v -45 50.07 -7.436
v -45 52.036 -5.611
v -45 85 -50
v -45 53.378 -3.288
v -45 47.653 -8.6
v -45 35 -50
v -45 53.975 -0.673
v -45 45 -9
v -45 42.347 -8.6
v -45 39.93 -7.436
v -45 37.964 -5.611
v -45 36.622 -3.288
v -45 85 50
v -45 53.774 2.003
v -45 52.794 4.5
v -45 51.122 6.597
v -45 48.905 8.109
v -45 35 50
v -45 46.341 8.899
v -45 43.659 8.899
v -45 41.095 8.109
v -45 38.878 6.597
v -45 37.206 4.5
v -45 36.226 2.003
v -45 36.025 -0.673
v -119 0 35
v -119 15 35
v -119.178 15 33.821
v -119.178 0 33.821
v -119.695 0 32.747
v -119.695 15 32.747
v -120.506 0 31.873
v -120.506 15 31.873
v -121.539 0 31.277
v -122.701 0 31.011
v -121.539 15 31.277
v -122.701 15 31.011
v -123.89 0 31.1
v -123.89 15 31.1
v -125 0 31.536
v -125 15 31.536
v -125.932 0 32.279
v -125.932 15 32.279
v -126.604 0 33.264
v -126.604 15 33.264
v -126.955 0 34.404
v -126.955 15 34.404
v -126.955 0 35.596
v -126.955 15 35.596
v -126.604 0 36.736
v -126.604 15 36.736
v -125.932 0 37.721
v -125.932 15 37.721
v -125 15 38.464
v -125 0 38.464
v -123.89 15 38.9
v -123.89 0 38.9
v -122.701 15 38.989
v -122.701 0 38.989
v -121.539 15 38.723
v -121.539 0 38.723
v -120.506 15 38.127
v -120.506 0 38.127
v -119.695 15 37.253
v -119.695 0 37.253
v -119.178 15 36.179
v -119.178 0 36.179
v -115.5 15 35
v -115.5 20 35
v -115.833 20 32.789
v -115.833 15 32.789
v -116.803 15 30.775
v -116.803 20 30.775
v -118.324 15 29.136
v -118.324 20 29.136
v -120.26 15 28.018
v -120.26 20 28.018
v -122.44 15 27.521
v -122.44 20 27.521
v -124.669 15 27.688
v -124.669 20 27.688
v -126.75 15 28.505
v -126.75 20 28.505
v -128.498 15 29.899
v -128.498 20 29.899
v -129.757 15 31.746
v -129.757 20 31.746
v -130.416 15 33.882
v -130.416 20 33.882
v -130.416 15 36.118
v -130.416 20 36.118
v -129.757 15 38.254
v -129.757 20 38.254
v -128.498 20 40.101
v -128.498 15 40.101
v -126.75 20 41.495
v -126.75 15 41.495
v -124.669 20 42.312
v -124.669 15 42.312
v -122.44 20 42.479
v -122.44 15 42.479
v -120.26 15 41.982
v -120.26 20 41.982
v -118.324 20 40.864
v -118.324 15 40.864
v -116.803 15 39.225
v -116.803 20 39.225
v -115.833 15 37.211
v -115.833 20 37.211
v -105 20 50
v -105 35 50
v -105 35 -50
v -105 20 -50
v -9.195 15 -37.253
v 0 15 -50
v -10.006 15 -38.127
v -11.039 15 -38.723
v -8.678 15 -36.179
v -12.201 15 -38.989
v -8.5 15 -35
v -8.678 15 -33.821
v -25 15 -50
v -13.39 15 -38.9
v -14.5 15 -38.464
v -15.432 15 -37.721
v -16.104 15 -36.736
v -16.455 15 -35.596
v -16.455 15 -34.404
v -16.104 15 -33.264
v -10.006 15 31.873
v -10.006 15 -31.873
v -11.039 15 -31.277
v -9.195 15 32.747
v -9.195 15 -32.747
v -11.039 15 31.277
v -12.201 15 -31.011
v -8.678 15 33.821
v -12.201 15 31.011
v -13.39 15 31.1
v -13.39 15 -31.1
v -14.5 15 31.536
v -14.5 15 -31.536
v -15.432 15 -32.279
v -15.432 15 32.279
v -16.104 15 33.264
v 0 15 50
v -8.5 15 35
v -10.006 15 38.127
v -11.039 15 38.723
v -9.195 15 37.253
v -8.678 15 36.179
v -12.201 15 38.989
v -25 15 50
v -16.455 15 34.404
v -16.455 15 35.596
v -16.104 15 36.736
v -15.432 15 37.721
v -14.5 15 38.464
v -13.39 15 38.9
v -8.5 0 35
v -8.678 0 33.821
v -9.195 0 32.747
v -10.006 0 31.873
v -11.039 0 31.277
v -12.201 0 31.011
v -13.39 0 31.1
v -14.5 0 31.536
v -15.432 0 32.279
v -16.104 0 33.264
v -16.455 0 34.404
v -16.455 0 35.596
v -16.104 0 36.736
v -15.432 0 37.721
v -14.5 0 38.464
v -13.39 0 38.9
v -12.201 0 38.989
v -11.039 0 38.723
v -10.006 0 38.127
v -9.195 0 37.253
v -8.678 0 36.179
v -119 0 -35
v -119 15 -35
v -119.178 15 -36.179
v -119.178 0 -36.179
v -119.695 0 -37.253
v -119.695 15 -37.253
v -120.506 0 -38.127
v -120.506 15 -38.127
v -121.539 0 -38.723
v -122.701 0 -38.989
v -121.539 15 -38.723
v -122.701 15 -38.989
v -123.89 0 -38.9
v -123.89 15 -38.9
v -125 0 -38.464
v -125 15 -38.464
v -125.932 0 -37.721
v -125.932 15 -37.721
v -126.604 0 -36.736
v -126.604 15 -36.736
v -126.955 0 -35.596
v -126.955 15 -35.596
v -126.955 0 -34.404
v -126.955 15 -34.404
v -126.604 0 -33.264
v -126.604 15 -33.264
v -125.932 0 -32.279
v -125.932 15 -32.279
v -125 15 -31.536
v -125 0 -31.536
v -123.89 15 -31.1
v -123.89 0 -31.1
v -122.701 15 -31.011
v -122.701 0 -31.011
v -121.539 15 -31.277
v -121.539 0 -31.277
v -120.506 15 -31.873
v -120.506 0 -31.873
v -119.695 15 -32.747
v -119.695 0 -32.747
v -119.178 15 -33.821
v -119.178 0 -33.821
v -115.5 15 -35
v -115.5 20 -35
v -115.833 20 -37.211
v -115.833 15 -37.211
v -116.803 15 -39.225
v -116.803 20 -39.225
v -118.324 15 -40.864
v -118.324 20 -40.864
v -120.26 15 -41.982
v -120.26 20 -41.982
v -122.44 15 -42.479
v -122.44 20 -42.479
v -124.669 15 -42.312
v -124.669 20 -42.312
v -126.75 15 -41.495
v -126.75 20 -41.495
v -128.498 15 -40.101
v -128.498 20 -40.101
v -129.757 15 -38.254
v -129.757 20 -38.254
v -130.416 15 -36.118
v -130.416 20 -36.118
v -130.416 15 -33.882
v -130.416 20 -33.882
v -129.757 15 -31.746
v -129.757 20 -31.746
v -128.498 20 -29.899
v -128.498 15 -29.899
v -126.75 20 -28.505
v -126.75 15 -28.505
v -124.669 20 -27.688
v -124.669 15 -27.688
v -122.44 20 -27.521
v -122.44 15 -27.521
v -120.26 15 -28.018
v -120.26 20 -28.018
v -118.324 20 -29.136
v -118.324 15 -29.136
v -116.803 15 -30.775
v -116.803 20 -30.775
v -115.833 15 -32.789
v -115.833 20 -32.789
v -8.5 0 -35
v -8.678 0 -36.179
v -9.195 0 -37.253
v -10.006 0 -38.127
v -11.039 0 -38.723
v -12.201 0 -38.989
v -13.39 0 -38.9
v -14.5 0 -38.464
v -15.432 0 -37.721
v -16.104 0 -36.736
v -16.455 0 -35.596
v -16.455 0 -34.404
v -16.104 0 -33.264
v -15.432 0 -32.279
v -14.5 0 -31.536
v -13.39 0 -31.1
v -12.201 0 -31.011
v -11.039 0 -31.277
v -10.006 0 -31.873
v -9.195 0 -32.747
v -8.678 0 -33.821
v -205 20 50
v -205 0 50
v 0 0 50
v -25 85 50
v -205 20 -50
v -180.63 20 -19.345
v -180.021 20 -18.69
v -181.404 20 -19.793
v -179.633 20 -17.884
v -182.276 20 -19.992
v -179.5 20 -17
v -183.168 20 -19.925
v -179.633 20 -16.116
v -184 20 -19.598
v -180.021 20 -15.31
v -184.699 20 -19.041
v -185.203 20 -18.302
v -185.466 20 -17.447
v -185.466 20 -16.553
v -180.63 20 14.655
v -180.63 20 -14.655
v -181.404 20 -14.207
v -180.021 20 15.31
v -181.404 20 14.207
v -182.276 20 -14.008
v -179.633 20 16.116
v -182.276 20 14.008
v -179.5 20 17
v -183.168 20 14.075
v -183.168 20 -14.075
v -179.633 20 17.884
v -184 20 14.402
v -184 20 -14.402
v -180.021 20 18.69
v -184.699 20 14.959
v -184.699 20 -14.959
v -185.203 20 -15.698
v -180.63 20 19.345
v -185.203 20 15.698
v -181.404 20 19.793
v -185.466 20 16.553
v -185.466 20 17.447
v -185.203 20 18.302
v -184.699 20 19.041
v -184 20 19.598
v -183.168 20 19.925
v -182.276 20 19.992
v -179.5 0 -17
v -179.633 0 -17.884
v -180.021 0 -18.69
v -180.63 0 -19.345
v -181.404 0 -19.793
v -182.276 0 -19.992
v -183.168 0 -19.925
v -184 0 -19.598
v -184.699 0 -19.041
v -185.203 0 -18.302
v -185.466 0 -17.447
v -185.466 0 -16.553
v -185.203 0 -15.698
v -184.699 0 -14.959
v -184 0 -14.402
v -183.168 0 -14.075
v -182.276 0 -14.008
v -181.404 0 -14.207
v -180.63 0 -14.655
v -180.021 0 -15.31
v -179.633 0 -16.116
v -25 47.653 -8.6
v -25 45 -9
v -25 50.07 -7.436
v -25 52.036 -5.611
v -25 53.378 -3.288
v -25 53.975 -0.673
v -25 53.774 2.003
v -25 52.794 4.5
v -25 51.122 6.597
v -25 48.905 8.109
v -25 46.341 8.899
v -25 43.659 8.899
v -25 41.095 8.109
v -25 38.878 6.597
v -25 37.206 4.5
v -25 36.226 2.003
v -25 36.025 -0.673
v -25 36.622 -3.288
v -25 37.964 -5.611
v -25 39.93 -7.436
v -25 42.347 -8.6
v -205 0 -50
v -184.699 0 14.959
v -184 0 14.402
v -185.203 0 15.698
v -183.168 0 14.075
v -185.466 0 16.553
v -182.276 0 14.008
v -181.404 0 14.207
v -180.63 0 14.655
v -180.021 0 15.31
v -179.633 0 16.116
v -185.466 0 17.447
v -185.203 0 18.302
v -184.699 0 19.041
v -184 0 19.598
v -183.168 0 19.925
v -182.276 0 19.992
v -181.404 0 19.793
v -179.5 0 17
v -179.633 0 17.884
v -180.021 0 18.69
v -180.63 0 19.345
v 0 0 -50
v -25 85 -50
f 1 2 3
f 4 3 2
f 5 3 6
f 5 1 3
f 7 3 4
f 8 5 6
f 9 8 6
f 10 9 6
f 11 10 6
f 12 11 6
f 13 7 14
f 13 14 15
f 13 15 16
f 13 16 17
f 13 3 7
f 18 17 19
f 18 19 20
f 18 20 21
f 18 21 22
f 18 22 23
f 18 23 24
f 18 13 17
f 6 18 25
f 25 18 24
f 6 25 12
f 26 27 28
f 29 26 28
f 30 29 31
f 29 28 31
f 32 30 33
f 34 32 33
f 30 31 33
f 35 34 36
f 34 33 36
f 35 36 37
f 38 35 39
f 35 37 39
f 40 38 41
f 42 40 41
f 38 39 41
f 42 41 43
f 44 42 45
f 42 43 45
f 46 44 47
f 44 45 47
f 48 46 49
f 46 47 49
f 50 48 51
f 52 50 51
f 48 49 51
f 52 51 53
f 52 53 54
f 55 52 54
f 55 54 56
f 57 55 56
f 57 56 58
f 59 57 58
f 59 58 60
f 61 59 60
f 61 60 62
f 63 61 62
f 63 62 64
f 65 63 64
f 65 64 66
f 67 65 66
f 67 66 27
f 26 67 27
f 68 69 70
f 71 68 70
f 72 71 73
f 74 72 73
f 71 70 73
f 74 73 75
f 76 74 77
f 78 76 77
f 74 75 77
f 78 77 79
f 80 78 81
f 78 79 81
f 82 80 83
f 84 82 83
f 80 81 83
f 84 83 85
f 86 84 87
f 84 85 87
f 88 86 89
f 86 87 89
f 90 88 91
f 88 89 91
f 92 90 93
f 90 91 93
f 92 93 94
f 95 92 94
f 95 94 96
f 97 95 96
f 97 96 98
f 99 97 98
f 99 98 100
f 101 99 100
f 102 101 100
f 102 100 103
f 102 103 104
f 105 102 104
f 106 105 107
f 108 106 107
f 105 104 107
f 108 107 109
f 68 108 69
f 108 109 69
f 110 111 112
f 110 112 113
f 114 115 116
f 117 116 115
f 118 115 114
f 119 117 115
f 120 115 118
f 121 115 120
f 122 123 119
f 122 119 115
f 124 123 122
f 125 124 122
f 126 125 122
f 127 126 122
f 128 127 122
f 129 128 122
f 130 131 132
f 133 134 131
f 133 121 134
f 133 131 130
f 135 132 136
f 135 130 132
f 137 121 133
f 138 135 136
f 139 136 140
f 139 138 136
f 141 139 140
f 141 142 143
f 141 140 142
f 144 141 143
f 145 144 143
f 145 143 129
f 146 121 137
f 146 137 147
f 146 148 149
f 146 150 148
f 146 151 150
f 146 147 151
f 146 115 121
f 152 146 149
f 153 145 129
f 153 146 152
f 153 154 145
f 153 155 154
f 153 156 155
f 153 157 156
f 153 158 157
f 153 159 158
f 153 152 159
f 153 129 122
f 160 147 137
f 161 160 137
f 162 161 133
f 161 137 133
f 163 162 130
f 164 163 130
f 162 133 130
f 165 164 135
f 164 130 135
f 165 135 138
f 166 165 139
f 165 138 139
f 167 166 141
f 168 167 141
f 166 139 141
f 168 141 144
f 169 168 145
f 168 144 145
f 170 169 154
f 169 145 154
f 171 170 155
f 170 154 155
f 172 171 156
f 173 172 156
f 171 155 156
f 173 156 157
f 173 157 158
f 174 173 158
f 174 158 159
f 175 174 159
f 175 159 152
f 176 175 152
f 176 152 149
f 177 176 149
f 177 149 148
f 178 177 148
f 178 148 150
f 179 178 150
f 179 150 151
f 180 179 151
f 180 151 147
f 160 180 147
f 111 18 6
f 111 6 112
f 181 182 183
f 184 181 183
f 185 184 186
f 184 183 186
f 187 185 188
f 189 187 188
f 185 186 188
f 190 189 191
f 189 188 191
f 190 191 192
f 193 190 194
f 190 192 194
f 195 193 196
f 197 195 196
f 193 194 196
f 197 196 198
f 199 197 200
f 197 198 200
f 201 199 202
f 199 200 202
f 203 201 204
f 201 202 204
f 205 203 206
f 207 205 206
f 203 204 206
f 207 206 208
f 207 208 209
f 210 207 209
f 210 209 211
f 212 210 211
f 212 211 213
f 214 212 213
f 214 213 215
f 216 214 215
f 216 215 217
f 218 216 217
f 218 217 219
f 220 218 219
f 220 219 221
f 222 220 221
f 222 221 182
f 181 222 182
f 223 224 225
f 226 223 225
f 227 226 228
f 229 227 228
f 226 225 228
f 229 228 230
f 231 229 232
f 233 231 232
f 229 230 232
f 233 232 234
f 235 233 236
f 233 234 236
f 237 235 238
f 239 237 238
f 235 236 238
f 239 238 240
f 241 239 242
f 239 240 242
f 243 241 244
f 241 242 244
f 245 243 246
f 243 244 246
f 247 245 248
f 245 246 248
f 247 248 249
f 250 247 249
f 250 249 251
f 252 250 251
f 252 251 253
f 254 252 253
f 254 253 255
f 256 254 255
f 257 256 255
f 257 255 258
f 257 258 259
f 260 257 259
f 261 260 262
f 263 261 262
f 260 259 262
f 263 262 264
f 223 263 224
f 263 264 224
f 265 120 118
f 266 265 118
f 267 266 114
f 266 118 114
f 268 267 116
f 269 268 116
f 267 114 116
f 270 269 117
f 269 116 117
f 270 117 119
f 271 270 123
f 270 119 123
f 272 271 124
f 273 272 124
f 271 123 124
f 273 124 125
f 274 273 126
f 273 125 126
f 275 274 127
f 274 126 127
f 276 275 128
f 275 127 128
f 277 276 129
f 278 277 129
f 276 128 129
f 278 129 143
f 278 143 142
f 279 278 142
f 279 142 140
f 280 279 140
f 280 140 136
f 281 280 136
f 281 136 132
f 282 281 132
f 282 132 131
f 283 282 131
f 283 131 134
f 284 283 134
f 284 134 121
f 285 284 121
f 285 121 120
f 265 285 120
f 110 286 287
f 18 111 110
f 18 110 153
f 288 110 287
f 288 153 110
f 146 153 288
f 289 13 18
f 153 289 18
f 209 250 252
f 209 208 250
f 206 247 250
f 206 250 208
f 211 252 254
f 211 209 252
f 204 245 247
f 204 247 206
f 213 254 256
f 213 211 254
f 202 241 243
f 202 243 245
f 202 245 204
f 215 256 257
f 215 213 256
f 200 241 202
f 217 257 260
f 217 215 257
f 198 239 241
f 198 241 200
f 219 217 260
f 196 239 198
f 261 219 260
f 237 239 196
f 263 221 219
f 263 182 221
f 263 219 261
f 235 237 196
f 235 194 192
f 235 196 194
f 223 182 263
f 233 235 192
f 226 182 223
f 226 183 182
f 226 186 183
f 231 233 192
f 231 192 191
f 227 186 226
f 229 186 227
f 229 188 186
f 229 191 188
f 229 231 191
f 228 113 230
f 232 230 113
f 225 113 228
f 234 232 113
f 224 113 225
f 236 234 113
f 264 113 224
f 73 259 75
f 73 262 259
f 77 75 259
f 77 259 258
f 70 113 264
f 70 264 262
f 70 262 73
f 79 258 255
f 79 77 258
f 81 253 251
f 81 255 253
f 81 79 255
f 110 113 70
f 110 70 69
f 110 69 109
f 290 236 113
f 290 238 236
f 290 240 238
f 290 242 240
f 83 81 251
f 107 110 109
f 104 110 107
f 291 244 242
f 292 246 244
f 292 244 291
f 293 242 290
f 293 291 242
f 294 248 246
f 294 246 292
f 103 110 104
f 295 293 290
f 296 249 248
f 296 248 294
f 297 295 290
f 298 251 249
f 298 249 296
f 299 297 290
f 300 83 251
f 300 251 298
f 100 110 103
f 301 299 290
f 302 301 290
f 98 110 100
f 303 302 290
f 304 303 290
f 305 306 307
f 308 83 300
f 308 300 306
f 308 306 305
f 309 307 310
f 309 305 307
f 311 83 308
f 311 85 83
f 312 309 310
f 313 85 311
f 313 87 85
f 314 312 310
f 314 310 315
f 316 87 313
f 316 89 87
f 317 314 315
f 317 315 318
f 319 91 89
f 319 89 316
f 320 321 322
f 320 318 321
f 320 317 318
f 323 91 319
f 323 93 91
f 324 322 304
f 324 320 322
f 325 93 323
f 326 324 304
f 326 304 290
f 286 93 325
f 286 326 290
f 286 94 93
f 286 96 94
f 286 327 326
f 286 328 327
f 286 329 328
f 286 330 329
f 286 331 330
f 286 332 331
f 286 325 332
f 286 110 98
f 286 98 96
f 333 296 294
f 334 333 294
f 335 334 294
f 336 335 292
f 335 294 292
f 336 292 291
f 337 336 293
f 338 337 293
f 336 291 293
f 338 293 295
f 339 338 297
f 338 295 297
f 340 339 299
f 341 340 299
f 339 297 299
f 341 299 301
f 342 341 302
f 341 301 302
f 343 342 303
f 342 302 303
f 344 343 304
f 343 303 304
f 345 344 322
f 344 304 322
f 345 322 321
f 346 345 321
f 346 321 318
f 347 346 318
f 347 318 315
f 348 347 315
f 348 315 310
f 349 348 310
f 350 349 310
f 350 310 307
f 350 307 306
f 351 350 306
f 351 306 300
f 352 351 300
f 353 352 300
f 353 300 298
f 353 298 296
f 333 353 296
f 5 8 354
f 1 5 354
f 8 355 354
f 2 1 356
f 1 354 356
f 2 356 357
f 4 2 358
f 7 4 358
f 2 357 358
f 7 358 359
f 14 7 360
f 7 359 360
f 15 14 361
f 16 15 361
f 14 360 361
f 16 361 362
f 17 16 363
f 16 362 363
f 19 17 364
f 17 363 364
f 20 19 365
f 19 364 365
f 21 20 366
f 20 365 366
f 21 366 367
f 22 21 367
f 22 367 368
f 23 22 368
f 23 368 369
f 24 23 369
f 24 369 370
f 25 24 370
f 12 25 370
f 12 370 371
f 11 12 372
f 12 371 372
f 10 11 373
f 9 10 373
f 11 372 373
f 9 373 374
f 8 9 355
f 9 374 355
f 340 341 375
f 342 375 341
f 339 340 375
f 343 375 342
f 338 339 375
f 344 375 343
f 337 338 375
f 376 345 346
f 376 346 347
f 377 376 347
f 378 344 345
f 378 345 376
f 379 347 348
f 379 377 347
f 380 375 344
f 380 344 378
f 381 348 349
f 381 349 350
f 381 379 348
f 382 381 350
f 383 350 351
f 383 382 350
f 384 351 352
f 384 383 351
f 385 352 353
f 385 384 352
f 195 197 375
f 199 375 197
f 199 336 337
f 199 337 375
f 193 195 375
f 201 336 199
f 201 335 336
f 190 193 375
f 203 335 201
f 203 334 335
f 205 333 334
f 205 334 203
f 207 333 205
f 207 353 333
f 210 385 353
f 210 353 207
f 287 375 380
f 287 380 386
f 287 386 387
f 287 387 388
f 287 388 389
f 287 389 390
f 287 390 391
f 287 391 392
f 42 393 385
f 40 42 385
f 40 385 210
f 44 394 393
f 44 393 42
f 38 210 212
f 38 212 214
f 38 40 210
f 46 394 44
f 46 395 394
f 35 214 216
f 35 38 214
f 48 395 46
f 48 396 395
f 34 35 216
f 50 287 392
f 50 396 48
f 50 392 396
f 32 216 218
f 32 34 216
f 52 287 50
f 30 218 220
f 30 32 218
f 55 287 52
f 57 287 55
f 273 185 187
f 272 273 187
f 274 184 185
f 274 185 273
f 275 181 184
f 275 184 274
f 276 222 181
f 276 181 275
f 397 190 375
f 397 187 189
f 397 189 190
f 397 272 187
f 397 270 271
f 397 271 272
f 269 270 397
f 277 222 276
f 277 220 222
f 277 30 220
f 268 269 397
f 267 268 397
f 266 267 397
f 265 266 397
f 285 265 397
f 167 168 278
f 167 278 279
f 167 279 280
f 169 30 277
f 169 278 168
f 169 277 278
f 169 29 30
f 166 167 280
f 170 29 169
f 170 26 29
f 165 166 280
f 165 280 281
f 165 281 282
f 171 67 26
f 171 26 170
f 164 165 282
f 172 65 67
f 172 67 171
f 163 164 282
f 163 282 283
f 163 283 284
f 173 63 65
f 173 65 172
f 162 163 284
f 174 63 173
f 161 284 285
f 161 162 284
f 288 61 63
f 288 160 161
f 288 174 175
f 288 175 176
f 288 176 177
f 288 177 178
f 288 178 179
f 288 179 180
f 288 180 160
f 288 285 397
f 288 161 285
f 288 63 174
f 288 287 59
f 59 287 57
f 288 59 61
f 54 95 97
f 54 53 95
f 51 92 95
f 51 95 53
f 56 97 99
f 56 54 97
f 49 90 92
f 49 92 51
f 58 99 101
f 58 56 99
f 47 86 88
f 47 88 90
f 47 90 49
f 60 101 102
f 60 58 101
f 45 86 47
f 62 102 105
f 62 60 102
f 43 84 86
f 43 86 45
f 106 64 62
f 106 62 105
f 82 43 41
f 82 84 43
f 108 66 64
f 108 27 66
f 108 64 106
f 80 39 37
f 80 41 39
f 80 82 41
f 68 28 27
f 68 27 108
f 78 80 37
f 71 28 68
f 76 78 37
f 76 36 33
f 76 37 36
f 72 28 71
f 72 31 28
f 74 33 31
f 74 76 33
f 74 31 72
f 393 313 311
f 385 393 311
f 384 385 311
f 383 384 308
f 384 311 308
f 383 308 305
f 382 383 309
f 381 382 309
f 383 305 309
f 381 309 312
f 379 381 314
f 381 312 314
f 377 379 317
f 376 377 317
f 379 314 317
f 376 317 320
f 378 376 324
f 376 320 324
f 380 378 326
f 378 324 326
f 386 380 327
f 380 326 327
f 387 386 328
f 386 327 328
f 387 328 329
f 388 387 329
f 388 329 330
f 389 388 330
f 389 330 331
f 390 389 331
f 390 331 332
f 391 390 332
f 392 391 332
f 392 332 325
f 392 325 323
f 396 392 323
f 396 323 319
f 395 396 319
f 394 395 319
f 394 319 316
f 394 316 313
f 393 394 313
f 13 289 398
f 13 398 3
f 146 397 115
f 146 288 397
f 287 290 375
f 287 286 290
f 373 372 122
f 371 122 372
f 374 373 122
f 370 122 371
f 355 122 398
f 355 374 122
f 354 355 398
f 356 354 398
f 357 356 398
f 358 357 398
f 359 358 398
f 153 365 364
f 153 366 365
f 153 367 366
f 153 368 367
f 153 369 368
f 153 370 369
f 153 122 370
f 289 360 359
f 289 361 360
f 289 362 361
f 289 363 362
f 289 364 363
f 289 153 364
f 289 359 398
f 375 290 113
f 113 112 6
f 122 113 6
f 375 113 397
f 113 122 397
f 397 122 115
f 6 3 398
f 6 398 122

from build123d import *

# Parameters (mm, degrees)
BOSS_EXTRUDE1_DEPTH = 50
SKETCH3_R           = 9
CUT_EXTRUDE1_DEPTH  = 50
SKETCH4_W           = 60
SKETCH4_H           = 42
BOSS_EXTRUDE3_DEPTH = 15
SKETCH6_R           = 3
SKETCH6_R_2         = 4
CUT_EXTRUDE3_DEPTH  = 21
SKETCH6_4_R         = 7.5
CUT_EXTRUDE4_DEPTH  = 5


with BuildPart() as part:
    # Sketch2 → Boss-Extrude1 (new body, symmetric)
    with BuildSketch(Plane.XY):
        Polygon((0, 0), (0, 15), (-25, 15), (-25, 85), (-45, 85), (-45, 35), (-105, 35), (-105, 20), (-205, 20), (-205, 0), align=None)
    extrude(amount=BOSS_EXTRUDE1_DEPTH, both=True)

    # Sketch3 → Cut-Extrude1 (cut, symmetric)
    with BuildSketch(Plane(origin=(-25, 0, 0), x_dir=(0, 0, -1), z_dir=(1, 0, 0))):
        with Locations((0, 45)):
            Circle(SKETCH3_R)
    extrude(amount=CUT_EXTRUDE1_DEPTH, both=True, mode=Mode.SUBTRACT)

    # Sketch4 → Boss-Extrude3 (add)
    with BuildSketch(Plane(origin=(0, 35, 0), x_dir=(1, 0, 0), z_dir=(0, 1, 0))):
        with Locations((-75, 0)):
            Rectangle(SKETCH4_W, SKETCH4_H)
    extrude(amount=-BOSS_EXTRUDE3_DEPTH)

    # Sketch6 → Cut-Extrude3 (cut, through all)
    with BuildSketch(Plane(origin=(0, 20, 0), x_dir=(1, 0, 0), z_dir=(0, 1, 0))):
        with Locations((-182.5, 17)):
            Circle(SKETCH6_R)
        with Locations((-123, 35)):
            Circle(SKETCH6_R_2)
        with Locations((-12.5, 35)):
            Circle(SKETCH6_R_2)
        with Locations((-12.5, -35)):
            Circle(SKETCH6_R_2)
        with Locations((-123, -35)):
            Circle(SKETCH6_R_2)
        with Locations((-182.5, -17)):
            Circle(SKETCH6_R)
    extrude(amount=-CUT_EXTRUDE3_DEPTH, mode=Mode.SUBTRACT)

    # Sketch6<4> → Cut-Extrude4 (cut)
    with BuildSketch(Plane(origin=(0, 20, 0), x_dir=(1, 0, 0), z_dir=(0, 1, 0))):
        with Locations((-123, 35)):
            Circle(SKETCH6_4_R)
        with Locations((-12.5, 35)):
            Circle(SKETCH6_4_R)
        with Locations((-12.5, -35)):
            Circle(SKETCH6_4_R)
        with Locations((-123, -35)):
            Circle(SKETCH6_4_R)
    extrude(amount=-CUT_EXTRUDE4_DEPTH, mode=Mode.SUBTRACT)


solid = part.part
